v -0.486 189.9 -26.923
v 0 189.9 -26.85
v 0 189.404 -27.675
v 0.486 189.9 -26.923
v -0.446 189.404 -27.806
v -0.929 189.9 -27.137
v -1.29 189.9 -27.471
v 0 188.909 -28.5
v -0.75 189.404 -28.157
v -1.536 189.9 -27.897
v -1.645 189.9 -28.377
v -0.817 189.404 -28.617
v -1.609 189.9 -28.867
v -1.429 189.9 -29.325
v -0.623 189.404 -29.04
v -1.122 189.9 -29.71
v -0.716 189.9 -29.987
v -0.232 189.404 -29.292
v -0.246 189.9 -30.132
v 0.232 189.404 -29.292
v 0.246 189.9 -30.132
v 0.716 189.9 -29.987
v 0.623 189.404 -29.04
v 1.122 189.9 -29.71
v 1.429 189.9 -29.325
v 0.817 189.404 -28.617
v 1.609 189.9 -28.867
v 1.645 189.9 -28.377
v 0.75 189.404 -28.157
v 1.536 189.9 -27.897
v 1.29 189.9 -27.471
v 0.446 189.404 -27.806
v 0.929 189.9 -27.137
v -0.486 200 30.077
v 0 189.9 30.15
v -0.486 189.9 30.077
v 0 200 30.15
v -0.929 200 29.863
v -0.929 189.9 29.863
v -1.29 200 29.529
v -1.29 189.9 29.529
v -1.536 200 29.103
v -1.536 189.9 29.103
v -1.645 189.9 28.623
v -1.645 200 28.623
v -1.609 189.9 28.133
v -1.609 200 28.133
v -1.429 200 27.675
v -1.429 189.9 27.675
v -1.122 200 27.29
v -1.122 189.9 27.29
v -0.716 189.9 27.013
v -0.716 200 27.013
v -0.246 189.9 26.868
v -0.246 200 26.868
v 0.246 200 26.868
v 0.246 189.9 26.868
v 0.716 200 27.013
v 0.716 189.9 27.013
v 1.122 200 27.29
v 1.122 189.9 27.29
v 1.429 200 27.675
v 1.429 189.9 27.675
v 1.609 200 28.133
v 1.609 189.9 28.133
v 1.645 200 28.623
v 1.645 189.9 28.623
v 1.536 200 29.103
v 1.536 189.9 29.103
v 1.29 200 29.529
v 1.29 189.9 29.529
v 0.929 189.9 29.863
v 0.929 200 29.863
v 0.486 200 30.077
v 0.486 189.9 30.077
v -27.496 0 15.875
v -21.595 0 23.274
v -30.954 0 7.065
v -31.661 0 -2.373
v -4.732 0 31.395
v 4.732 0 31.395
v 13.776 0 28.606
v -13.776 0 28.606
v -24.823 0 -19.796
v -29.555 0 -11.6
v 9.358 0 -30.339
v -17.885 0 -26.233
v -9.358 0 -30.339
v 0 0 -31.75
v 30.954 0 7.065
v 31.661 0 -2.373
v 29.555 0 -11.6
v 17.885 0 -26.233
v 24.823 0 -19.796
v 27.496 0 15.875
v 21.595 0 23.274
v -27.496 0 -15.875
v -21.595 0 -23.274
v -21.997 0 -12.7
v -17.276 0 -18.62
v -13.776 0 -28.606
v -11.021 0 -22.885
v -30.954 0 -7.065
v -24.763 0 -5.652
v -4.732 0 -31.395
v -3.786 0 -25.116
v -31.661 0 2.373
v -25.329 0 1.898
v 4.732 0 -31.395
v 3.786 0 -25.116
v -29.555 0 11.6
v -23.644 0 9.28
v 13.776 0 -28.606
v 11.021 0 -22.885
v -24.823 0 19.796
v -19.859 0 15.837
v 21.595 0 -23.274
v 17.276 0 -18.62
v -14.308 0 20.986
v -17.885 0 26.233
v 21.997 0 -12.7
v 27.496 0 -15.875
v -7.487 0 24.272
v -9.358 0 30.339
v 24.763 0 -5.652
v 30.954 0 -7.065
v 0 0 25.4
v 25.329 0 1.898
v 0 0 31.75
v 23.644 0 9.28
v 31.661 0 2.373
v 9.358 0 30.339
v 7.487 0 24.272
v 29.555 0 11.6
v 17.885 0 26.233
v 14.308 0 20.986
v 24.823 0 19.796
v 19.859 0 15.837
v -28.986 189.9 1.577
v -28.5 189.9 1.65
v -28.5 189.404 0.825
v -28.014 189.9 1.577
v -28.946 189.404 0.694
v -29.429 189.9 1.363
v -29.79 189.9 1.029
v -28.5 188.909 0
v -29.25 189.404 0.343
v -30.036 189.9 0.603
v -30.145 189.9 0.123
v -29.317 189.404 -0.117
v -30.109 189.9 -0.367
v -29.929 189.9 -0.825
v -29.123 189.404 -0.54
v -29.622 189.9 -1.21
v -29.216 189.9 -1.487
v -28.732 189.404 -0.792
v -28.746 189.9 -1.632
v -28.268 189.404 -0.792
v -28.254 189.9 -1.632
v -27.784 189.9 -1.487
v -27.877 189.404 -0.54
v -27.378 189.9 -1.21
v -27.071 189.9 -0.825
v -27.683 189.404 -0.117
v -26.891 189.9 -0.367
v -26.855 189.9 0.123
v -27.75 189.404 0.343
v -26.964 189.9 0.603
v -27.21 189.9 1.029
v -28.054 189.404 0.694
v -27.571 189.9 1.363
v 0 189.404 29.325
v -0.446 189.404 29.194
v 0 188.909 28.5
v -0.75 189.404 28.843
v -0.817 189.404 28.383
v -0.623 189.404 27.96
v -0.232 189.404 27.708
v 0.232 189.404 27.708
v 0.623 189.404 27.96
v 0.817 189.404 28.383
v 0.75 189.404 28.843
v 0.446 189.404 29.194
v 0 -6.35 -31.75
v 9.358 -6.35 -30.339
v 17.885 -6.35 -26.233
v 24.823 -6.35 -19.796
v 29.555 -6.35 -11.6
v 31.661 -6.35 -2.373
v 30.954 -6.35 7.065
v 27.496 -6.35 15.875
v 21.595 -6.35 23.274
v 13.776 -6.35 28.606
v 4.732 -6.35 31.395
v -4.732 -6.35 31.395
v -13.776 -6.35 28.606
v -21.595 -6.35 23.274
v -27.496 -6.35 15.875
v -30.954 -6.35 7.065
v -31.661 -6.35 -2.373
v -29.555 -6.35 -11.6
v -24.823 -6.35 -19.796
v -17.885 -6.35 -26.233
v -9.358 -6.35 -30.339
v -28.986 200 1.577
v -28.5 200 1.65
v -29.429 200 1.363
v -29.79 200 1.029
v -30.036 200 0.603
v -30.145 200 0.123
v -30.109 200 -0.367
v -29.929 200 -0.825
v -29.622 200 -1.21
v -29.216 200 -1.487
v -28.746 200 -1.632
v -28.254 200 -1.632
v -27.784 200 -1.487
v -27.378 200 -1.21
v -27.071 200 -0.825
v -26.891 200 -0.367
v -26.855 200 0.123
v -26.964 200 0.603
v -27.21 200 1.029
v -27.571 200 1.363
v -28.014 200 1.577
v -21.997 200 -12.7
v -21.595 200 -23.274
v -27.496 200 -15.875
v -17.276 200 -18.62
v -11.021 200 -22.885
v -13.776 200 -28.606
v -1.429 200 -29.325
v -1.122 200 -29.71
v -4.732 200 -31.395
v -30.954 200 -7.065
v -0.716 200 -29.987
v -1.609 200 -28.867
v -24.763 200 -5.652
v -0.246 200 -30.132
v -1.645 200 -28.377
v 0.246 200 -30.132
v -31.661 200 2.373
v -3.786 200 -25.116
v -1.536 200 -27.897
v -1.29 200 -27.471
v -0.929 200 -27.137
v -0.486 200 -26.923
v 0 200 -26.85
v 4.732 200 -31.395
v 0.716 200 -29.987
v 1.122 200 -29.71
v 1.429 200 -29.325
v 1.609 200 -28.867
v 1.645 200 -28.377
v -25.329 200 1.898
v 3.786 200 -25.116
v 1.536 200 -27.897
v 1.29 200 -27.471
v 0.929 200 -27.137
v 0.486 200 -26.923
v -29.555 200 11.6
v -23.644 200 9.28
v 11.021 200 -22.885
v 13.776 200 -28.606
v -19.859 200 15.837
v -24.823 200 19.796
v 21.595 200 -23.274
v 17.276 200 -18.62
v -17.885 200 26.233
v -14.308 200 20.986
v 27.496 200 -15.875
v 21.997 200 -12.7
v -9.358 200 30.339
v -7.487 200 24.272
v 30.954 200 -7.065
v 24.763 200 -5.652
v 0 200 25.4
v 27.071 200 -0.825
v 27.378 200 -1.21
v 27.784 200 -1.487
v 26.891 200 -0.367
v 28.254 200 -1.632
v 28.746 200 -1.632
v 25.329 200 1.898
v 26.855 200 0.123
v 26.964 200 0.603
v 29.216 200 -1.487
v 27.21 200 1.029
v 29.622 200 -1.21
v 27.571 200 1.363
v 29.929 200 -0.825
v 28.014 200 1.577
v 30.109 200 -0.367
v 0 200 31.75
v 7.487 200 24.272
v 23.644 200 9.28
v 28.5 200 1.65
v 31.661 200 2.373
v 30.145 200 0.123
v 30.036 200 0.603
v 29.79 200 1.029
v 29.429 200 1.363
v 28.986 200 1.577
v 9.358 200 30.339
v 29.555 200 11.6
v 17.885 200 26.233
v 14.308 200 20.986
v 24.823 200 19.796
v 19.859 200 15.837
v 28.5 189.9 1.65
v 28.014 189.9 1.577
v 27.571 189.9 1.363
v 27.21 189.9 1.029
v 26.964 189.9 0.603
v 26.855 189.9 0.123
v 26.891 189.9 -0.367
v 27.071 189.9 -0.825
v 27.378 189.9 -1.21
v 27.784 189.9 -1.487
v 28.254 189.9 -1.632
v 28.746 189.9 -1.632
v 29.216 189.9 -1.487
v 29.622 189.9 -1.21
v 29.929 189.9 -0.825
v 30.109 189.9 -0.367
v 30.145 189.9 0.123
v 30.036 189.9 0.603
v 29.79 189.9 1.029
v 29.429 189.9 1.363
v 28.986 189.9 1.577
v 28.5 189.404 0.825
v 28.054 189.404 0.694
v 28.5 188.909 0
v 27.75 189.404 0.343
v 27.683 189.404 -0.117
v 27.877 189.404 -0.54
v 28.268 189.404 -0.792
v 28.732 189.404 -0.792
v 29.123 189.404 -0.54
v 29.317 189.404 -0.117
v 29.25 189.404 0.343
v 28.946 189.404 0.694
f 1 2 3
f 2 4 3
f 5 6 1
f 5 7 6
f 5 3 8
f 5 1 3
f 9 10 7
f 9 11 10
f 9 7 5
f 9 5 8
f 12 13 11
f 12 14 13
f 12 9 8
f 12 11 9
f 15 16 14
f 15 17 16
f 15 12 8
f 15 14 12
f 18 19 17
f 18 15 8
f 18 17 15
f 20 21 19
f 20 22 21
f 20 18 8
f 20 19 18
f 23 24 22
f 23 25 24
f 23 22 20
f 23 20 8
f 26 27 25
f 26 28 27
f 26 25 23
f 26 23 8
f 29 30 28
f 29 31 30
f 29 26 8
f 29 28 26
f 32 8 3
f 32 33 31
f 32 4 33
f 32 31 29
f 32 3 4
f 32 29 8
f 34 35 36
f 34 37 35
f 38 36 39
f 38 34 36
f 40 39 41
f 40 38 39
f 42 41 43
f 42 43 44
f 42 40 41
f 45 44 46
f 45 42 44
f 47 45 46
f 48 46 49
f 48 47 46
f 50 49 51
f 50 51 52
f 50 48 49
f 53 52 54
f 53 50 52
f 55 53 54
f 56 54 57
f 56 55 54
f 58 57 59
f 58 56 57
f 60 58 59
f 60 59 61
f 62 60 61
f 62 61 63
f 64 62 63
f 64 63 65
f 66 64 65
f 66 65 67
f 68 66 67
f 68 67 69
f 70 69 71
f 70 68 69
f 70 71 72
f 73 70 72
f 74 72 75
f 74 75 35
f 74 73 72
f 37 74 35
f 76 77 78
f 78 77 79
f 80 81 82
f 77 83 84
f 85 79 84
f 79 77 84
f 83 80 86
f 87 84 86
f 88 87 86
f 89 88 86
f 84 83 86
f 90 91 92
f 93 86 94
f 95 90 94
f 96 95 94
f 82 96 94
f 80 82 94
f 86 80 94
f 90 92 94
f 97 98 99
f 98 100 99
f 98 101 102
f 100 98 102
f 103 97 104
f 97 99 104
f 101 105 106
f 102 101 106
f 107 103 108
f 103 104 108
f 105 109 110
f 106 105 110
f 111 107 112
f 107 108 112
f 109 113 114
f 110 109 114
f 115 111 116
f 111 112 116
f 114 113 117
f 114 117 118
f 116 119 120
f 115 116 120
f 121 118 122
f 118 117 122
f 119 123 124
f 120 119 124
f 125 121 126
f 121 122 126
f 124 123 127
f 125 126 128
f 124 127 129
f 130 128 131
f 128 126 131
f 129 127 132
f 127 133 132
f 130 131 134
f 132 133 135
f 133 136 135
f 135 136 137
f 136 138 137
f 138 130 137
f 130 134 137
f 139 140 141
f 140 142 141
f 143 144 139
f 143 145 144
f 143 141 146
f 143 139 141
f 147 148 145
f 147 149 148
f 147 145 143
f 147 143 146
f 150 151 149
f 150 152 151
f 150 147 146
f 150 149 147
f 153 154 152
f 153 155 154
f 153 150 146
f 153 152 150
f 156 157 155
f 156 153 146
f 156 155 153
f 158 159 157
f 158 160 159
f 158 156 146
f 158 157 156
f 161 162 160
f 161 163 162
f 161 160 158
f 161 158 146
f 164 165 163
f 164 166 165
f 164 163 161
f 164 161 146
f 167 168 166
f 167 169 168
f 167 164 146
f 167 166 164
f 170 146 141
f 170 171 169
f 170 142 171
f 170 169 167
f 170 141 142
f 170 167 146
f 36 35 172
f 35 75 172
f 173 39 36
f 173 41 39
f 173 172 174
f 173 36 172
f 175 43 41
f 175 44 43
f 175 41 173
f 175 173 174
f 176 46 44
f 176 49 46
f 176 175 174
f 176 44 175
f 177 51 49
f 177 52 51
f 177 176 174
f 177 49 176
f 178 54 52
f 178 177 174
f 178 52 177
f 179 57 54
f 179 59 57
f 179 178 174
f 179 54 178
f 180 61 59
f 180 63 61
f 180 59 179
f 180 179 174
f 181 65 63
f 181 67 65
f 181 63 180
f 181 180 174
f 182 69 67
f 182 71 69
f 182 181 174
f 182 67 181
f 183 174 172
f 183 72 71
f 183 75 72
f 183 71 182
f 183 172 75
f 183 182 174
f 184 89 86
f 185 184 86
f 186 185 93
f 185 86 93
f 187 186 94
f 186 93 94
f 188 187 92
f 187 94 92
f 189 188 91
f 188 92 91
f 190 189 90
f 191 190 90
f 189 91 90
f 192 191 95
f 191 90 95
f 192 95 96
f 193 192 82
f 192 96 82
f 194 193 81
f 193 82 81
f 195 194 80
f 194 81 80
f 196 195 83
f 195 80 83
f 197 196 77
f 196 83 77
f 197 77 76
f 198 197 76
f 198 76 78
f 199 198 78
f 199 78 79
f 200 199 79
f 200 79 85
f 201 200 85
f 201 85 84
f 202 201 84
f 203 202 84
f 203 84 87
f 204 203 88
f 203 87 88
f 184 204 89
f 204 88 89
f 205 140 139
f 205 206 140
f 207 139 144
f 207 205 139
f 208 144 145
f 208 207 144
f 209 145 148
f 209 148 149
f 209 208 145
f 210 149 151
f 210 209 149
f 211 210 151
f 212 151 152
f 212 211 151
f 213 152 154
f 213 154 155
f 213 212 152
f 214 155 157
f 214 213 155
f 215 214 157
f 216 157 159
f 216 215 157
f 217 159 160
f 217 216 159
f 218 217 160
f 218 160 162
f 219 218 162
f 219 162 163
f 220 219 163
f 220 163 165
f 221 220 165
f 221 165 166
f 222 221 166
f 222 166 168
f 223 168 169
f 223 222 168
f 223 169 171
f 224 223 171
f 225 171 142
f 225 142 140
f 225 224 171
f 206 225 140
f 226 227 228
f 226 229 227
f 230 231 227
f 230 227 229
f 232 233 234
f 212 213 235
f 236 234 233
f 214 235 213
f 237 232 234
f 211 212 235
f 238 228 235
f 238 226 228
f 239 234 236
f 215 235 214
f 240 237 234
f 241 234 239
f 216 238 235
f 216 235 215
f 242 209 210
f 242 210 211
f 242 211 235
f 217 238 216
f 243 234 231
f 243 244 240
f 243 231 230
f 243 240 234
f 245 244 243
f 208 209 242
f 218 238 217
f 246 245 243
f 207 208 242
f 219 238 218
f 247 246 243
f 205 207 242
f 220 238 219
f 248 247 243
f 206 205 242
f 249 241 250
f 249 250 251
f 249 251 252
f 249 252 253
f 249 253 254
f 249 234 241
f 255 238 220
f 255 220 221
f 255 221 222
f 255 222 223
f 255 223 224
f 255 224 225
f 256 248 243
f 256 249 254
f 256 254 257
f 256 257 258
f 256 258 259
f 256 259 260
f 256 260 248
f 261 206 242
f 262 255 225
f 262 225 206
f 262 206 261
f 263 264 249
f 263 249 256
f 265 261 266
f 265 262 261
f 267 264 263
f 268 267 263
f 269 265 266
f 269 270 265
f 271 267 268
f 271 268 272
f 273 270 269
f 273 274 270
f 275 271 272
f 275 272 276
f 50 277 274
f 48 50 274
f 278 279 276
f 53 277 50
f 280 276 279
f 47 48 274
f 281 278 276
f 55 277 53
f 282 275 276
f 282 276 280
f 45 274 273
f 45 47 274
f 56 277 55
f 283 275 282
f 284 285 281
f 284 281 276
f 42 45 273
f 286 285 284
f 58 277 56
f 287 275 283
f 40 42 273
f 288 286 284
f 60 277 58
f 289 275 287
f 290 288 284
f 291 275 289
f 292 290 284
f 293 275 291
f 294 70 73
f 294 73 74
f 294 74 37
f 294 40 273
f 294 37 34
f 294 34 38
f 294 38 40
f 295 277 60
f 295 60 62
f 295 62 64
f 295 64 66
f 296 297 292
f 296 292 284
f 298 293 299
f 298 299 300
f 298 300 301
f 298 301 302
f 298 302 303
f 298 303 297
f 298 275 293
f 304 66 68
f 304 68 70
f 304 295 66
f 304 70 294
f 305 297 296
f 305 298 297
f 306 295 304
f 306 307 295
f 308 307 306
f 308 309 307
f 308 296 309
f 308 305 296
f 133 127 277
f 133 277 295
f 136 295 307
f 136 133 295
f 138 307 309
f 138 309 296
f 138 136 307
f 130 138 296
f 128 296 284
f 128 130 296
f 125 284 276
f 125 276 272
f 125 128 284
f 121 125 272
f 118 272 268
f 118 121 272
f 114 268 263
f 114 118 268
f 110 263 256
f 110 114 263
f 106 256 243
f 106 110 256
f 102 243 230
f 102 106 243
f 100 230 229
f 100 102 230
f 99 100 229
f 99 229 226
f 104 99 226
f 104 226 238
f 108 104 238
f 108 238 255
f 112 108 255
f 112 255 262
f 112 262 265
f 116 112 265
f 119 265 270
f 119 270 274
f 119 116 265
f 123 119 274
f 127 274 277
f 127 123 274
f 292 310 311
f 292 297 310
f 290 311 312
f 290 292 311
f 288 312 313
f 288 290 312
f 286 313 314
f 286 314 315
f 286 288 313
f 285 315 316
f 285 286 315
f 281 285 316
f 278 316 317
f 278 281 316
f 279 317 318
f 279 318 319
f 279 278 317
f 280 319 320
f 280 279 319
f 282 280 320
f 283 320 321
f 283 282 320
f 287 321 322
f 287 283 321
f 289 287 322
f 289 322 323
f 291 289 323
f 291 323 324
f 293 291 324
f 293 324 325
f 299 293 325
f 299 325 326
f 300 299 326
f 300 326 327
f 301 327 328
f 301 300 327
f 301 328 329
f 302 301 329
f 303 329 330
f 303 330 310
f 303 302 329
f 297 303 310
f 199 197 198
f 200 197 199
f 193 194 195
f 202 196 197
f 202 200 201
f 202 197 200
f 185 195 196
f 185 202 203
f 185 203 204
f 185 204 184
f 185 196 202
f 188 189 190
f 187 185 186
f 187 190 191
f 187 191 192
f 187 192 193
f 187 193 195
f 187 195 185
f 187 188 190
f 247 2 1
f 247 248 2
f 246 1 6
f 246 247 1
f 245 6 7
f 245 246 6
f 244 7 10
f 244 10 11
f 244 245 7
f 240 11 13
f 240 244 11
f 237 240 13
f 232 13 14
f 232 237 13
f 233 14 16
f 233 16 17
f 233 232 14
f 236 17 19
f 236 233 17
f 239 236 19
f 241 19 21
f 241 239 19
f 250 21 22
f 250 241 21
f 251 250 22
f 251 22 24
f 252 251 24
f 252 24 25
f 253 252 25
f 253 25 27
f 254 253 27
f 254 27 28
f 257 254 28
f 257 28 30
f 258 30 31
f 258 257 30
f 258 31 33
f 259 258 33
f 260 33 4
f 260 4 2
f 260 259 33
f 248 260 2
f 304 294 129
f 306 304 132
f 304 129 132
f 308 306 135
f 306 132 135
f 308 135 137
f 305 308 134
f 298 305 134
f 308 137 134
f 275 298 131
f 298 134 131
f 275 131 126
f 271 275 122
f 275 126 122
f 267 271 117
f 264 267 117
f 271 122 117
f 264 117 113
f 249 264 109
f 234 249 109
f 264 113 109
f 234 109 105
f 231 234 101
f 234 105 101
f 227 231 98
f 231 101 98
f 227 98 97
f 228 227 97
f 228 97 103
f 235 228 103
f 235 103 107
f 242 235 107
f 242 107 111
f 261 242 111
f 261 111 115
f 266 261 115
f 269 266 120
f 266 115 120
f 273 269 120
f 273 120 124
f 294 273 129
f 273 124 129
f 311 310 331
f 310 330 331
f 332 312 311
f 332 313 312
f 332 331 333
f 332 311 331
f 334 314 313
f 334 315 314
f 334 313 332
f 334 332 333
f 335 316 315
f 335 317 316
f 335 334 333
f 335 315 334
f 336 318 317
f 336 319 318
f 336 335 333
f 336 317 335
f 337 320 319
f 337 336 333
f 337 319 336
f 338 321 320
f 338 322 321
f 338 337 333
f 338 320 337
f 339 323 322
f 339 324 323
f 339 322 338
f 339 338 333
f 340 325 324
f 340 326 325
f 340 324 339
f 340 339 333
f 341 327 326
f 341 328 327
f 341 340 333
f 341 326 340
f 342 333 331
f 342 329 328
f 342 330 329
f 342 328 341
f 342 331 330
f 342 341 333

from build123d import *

# Parameters (mm, degrees)
SKETCH1_R                      = 31.75
SKETCH1_R_2                    = 25.4
BOSS_EXTRUDE1_DEPTH            = 200
SKETCH2_R                      = 31.75
BOSS_EXTRUDE2_DEPTH            = 6.35
M4X0_7_TAPPED_HOLE1_AT_2_COUNT = 2
M4X0_7_TAPPED_HOLE1_AT_2_PITCH = 40.305086528
M4X0_7_TAPPED_HOLE1_AT_3_COUNT = 2
M4X0_7_TAPPED_HOLE1_AT_3_PITCH = 57
M4X0_7_TAPPED_HOLE1_AT_4_COUNT = 2
M4X0_7_TAPPED_HOLE1_AT_4_PITCH = 40.305086528


with BuildPart() as part:
    # Sketch1 → Boss-Extrude1 (new body)
    with BuildSketch(Plane(origin=(0, 0, 0), x_dir=(1, 0, 0), z_dir=(0, 1, 0))):
        with Locations(Location((0, 0, 0), (0, 0, 270))):
            Circle(SKETCH1_R)
        with Locations(Location((0, 0, 0), (0, 0, 270))):
            Circle(SKETCH1_R_2, mode=Mode.SUBTRACT)
    extrude(amount=BOSS_EXTRUDE1_DEPTH)

    # Sketch3 → M4x0.7 Tapped Hole1 (revolve, cut)
    with BuildSketch(Plane(origin=(0, 200, -28.5), x_dir=(0, 0, 1), z_dir=(1, 0, 0))):
        Polygon((0, 0), (0, 11.091420021), (1.65, 10.1), (1.65, 0), align=None)
    m4x0_7_tapped_hole1 = revolve(axis=Axis((0, 206.35, -28.5), (0, -1, 0)), mode=Mode.SUBTRACT)

    # M4x0.7 Tapped Hole1 at 2: M4x0.7 Tapped Hole1 ×2
    with Locations(*[Vector(0.7071067811865476, 0, 0.7071067811865476) * (i * M4X0_7_TAPPED_HOLE1_AT_2_PITCH) for i in range(1, M4X0_7_TAPPED_HOLE1_AT_2_COUNT)]):
        add(m4x0_7_tapped_hole1, mode=Mode.SUBTRACT)

    # M4x0.7 Tapped Hole1 at 3: M4x0.7 Tapped Hole1 ×2
    with Locations(*[(0, 0, i * M4X0_7_TAPPED_HOLE1_AT_3_PITCH) for i in range(1, M4X0_7_TAPPED_HOLE1_AT_3_COUNT)]):
        add(m4x0_7_tapped_hole1, mode=Mode.SUBTRACT)

    # M4x0.7 Tapped Hole1 at 4: M4x0.7 Tapped Hole1 ×2
    with Locations(*[Vector(-0.7071067811865476, 0, 0.7071067811865476) * (i * M4X0_7_TAPPED_HOLE1_AT_4_PITCH) for i in range(1, M4X0_7_TAPPED_HOLE1_AT_4_COUNT)]):
        add(m4x0_7_tapped_hole1, mode=Mode.SUBTRACT)


with BuildPart() as body_2:
    # Sketch2 → Boss-Extrude2 (new body)
    with BuildSketch(Plane.XZ):
        with Locations(Location((0, 0, 0), (0, 0, 270))):
            Circle(SKETCH2_R)
    extrude(amount=BOSS_EXTRUDE2_DEPTH)


solid = Compound([part.part, body_2.part])
